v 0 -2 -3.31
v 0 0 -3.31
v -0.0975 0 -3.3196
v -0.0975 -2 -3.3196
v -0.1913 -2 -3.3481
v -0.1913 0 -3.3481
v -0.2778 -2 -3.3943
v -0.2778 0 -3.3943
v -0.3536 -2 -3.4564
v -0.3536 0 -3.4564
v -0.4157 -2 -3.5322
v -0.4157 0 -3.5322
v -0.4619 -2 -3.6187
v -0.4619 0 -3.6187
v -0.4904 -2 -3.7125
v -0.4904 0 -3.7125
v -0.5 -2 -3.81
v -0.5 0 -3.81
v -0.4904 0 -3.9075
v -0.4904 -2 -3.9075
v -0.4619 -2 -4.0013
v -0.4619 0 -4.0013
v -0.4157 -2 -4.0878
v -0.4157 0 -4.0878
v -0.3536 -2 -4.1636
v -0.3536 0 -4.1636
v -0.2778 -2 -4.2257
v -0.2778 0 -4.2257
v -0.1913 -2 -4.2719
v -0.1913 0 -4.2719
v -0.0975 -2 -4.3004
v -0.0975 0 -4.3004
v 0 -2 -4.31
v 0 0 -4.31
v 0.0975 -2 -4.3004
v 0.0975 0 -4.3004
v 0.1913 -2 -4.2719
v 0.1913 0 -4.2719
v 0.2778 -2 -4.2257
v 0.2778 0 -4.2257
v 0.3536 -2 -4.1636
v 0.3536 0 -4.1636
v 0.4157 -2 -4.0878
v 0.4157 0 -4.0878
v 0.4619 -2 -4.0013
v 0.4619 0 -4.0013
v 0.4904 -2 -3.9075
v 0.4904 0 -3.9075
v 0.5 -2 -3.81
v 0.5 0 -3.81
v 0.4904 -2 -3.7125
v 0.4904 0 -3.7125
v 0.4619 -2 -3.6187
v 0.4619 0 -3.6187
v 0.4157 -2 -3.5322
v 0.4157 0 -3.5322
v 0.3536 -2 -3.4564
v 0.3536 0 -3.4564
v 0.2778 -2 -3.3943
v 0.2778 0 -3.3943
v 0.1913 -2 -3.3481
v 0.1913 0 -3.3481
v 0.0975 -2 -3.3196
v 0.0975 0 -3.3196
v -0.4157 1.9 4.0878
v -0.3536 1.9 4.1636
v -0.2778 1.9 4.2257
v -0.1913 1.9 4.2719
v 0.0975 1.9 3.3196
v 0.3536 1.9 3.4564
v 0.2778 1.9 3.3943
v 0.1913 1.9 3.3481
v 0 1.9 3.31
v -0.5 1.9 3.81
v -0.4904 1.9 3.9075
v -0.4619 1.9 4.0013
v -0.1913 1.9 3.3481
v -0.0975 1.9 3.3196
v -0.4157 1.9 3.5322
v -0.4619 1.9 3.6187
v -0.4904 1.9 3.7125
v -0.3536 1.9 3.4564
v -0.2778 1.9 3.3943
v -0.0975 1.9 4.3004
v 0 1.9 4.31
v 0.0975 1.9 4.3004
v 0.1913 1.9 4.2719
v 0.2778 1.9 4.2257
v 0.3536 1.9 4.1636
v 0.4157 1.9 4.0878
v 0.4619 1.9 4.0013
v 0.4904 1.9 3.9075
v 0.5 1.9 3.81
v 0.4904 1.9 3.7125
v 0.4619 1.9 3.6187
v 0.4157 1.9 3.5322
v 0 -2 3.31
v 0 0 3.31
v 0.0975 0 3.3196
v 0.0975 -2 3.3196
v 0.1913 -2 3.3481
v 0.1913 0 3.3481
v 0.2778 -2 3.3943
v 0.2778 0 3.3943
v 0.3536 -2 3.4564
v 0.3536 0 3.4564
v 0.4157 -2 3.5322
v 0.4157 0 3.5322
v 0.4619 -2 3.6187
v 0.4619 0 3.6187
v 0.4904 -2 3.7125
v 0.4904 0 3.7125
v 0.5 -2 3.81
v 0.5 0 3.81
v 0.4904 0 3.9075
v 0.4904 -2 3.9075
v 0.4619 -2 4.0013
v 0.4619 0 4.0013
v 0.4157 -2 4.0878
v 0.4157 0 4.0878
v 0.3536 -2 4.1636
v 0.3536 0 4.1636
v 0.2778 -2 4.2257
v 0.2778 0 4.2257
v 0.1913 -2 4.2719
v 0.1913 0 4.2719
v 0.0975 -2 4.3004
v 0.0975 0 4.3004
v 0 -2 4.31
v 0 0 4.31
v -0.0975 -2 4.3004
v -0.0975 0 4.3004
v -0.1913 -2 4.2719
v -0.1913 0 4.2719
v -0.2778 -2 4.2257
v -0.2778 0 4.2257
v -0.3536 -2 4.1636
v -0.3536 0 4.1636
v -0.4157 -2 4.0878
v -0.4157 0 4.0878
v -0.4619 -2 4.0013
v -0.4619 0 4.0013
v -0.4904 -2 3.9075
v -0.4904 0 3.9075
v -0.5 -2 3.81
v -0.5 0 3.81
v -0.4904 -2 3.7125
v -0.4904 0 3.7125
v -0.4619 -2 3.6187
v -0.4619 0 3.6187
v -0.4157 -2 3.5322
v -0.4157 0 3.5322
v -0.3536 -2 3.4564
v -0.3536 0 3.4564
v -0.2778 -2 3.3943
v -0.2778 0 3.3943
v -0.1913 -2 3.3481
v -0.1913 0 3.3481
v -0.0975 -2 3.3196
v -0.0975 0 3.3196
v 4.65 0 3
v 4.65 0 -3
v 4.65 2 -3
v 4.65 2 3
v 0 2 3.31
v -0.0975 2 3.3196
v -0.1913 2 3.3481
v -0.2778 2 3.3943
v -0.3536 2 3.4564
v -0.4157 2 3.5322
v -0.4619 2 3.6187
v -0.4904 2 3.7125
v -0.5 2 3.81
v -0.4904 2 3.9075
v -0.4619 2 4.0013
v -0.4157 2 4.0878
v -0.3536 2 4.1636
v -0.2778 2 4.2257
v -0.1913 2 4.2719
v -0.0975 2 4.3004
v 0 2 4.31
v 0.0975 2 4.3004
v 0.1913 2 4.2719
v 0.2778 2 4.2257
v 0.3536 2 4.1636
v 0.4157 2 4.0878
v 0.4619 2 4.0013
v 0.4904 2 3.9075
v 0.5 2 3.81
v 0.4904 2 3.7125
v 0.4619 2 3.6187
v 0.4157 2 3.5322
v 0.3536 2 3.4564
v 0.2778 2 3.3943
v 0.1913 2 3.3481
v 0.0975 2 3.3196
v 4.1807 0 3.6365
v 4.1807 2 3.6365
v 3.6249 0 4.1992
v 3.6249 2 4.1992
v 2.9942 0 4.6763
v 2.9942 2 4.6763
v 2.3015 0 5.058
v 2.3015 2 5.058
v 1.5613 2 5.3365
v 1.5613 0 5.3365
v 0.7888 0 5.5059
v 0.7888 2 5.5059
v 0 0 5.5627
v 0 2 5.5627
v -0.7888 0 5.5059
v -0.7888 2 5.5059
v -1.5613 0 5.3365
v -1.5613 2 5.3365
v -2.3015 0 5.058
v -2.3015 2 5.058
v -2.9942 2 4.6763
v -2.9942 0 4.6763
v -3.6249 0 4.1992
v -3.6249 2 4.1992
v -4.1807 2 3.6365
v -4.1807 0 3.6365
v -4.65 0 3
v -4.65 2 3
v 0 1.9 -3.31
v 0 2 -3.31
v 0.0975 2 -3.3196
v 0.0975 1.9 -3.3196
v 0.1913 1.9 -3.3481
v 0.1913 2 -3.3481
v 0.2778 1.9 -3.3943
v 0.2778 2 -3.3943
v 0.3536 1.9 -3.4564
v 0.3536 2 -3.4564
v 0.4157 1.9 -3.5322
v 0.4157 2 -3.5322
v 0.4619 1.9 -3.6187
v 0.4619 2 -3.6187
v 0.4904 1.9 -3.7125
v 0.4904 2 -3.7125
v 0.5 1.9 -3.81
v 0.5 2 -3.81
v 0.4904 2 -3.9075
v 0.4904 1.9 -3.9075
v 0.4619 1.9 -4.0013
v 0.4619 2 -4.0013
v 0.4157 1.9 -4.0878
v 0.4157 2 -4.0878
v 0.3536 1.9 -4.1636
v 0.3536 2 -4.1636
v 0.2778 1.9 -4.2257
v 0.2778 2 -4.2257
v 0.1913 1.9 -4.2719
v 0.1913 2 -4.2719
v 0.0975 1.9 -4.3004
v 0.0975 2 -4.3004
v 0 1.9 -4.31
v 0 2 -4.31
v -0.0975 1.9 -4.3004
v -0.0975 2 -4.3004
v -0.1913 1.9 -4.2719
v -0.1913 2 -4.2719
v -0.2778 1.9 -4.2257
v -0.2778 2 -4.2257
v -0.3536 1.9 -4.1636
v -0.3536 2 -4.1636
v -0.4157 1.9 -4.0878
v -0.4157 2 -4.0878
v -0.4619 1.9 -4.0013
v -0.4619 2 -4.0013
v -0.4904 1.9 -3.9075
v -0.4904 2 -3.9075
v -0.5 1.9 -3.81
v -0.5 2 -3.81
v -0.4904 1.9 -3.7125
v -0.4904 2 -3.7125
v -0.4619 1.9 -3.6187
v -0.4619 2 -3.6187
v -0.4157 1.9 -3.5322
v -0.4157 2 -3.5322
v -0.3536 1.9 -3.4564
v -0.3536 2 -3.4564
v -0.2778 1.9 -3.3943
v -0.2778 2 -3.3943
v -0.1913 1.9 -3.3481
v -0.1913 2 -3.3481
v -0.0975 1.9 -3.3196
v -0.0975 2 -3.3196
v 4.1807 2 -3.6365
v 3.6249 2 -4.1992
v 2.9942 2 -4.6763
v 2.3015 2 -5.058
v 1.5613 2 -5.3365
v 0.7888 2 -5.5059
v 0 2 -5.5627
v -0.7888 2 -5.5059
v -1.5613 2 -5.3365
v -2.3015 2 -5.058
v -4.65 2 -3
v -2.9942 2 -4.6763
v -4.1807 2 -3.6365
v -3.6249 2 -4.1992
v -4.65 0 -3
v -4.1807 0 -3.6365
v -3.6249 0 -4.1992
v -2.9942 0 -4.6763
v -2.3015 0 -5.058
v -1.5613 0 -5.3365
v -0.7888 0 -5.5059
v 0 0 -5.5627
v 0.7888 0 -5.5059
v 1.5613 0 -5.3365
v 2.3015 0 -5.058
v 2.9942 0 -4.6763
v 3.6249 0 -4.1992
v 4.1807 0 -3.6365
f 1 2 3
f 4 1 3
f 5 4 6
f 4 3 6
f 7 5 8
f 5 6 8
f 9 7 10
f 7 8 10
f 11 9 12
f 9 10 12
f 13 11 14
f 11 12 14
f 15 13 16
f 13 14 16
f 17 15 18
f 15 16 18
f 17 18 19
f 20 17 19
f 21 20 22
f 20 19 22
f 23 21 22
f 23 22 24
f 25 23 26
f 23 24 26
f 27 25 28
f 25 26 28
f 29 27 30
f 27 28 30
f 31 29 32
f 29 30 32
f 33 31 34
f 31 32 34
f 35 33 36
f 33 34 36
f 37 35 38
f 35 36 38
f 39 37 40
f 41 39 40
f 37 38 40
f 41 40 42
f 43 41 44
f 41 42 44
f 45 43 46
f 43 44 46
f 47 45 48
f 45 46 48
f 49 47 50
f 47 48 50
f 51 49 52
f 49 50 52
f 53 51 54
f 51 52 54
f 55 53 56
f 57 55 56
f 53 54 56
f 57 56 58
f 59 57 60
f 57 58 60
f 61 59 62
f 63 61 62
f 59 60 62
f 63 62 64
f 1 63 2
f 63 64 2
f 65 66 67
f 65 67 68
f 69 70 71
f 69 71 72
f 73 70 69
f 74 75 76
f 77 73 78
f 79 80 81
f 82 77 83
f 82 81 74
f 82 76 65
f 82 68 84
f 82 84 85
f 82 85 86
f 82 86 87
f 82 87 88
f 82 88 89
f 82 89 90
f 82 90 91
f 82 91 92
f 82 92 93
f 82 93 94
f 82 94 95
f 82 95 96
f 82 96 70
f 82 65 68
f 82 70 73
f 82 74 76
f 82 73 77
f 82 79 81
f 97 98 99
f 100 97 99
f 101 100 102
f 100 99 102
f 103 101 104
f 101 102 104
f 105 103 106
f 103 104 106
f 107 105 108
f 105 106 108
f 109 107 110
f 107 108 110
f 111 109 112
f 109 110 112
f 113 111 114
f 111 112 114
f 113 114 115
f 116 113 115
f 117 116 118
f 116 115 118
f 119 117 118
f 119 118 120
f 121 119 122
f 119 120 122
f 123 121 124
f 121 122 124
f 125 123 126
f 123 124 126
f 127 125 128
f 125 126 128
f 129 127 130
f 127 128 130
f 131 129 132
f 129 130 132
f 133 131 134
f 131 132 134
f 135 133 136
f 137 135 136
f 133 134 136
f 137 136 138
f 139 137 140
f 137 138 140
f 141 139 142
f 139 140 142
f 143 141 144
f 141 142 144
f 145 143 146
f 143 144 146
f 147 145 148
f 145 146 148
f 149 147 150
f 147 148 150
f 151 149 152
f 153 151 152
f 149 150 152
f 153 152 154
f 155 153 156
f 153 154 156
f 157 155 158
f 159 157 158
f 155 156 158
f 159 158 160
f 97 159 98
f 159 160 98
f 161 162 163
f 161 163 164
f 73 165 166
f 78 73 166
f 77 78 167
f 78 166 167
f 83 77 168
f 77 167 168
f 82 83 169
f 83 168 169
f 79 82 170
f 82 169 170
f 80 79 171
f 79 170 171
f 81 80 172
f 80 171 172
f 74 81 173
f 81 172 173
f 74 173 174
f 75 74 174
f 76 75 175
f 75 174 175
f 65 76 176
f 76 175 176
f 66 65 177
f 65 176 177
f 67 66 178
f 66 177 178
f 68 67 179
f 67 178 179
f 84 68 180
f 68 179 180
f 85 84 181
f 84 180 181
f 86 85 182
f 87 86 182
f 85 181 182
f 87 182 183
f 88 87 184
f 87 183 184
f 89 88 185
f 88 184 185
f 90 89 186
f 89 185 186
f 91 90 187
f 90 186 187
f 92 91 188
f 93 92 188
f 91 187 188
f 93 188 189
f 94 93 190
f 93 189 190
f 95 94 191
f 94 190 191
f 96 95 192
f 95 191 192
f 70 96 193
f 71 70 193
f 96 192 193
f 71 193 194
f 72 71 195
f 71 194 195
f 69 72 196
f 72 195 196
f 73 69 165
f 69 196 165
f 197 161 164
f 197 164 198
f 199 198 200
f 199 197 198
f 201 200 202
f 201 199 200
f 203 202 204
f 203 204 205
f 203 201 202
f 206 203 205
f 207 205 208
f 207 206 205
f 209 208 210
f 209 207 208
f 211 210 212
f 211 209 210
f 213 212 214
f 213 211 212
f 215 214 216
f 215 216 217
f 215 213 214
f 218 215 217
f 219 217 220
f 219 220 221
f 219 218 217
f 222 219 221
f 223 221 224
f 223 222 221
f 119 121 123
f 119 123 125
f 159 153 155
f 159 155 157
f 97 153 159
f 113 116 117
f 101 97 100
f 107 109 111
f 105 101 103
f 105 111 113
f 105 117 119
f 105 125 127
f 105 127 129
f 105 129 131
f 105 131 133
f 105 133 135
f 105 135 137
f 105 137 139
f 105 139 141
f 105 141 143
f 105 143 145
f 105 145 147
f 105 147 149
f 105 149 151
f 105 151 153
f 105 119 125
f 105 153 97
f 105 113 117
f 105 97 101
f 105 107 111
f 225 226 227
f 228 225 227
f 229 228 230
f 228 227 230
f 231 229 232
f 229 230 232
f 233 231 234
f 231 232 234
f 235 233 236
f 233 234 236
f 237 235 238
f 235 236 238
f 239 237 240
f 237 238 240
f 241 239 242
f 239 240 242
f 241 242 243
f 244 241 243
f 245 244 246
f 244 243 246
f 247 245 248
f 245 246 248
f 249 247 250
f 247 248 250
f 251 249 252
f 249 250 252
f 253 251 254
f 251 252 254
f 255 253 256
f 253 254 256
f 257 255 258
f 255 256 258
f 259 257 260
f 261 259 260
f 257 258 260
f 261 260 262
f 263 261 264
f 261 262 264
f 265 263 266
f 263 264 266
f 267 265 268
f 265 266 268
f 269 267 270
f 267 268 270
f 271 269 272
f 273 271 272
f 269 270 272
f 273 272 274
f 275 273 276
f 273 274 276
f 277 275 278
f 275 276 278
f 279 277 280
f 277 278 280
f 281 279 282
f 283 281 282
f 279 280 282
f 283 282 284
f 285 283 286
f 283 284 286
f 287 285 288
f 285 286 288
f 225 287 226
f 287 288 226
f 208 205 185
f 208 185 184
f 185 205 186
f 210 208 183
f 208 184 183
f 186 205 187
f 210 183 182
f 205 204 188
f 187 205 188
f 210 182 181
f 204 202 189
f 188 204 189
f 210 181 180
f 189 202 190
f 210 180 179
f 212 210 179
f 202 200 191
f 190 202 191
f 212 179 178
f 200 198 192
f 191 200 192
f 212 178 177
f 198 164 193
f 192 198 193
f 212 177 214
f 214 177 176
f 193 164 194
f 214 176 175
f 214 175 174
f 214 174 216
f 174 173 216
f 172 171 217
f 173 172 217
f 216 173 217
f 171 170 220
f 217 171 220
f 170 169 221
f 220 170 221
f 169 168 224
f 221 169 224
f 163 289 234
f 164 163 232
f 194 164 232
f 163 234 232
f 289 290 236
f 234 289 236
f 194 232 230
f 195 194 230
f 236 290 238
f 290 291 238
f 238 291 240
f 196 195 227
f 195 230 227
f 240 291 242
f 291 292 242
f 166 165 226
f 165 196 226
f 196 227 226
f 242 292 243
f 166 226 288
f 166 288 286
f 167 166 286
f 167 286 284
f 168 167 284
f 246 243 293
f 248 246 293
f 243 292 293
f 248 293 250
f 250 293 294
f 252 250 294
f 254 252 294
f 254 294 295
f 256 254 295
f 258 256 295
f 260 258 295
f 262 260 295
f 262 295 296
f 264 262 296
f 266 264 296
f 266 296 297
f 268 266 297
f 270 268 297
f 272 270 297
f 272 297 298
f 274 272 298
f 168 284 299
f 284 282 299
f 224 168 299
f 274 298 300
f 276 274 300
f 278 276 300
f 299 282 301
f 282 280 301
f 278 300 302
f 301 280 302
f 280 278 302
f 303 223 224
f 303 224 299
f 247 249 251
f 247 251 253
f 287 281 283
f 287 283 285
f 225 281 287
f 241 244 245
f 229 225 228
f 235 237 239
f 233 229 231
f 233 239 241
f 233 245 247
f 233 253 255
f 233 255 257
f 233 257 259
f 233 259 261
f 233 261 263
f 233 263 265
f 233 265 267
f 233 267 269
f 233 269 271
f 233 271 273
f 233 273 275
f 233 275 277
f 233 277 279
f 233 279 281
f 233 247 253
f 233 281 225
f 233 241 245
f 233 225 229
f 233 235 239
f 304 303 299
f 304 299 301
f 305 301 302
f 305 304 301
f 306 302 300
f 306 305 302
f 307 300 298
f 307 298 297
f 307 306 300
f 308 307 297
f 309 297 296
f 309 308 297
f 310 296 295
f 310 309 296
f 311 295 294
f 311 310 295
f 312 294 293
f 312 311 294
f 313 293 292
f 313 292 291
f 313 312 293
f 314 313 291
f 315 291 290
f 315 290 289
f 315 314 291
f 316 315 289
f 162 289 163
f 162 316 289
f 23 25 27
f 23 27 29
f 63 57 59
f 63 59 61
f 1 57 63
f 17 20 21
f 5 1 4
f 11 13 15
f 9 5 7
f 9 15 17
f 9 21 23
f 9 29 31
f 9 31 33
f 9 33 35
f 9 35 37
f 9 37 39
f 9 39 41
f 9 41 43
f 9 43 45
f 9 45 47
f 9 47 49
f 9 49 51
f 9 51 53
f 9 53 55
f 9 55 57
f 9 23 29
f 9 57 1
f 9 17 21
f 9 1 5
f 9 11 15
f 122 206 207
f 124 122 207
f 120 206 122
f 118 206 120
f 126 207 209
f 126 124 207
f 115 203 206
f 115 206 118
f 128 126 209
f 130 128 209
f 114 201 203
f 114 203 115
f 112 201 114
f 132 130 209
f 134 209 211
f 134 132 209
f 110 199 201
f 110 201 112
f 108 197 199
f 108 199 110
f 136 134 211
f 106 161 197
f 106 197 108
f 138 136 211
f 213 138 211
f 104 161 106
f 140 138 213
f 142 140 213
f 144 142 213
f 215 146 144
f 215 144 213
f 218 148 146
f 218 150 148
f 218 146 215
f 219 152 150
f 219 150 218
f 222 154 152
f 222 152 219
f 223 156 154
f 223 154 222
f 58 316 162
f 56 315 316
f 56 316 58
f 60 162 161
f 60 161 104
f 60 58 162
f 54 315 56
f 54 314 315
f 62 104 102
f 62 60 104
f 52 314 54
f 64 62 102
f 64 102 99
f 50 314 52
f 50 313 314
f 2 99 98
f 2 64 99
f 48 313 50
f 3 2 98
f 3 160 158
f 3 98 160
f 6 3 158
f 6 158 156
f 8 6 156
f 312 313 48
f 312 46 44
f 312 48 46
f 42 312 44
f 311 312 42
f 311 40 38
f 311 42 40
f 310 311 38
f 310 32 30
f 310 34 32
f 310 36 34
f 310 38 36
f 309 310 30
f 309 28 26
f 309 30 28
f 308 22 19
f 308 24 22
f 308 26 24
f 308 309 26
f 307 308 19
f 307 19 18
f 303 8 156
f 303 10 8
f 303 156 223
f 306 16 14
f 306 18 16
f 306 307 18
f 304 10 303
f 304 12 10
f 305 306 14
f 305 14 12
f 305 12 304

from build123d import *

# Parameters (mm, degrees)
BASE_EXTRUDE_DEPTH = 2
SKETCH2_R          = 0.5
PIN_EXTRUDE_DEPTH  = 2
SKETCH3_R          = 0.5
PIN_CUT_DEPTH      = 0.1


with BuildPart() as part:
    # Sketch1 → Base-Extrude (new body)
    with BuildSketch(Plane(origin=(0, 0, 0), x_dir=(1, 0, 0), z_dir=(0, 1, 0))):
        with BuildLine():
            Line((4.65, 3), (4.65, -3))
            ThreePointArc((4.65, -3), (0, -5.562739371), (-4.65, -3))
            Line((-4.65, -3), (-4.65, 3))
            ThreePointArc((-4.65, 3), (0, 5.562739371), (4.65, 3))
        make_face()
    extrude(amount=BASE_EXTRUDE_DEPTH)

    # Sketch2 → Pin-Extrude (add)
    with BuildSketch(Plane.XZ):
        with Locations(Location((0, 3.81, 0), (0, 0, 270))):
            Circle(SKETCH2_R)
        with Locations(Location((0, -3.81, 0), (0, 0, 90))):
            Circle(SKETCH2_R)
    extrude(amount=PIN_EXTRUDE_DEPTH)

    # Sketch3 → Pin-Cut (cut)
    with BuildSketch(Plane(origin=(0, 2, 0), x_dir=(1, 0, 0), z_dir=(0, 1, 0))):
        with Locations(Location((0, 3.81, 0), (0, 0, 270))):
            Circle(SKETCH3_R)
        with Locations(Location((0, -3.81, 0), (0, 0, 90))):
            Circle(SKETCH3_R)
    extrude(amount=-PIN_CUT_DEPTH, mode=Mode.SUBTRACT)


solid = part.part
